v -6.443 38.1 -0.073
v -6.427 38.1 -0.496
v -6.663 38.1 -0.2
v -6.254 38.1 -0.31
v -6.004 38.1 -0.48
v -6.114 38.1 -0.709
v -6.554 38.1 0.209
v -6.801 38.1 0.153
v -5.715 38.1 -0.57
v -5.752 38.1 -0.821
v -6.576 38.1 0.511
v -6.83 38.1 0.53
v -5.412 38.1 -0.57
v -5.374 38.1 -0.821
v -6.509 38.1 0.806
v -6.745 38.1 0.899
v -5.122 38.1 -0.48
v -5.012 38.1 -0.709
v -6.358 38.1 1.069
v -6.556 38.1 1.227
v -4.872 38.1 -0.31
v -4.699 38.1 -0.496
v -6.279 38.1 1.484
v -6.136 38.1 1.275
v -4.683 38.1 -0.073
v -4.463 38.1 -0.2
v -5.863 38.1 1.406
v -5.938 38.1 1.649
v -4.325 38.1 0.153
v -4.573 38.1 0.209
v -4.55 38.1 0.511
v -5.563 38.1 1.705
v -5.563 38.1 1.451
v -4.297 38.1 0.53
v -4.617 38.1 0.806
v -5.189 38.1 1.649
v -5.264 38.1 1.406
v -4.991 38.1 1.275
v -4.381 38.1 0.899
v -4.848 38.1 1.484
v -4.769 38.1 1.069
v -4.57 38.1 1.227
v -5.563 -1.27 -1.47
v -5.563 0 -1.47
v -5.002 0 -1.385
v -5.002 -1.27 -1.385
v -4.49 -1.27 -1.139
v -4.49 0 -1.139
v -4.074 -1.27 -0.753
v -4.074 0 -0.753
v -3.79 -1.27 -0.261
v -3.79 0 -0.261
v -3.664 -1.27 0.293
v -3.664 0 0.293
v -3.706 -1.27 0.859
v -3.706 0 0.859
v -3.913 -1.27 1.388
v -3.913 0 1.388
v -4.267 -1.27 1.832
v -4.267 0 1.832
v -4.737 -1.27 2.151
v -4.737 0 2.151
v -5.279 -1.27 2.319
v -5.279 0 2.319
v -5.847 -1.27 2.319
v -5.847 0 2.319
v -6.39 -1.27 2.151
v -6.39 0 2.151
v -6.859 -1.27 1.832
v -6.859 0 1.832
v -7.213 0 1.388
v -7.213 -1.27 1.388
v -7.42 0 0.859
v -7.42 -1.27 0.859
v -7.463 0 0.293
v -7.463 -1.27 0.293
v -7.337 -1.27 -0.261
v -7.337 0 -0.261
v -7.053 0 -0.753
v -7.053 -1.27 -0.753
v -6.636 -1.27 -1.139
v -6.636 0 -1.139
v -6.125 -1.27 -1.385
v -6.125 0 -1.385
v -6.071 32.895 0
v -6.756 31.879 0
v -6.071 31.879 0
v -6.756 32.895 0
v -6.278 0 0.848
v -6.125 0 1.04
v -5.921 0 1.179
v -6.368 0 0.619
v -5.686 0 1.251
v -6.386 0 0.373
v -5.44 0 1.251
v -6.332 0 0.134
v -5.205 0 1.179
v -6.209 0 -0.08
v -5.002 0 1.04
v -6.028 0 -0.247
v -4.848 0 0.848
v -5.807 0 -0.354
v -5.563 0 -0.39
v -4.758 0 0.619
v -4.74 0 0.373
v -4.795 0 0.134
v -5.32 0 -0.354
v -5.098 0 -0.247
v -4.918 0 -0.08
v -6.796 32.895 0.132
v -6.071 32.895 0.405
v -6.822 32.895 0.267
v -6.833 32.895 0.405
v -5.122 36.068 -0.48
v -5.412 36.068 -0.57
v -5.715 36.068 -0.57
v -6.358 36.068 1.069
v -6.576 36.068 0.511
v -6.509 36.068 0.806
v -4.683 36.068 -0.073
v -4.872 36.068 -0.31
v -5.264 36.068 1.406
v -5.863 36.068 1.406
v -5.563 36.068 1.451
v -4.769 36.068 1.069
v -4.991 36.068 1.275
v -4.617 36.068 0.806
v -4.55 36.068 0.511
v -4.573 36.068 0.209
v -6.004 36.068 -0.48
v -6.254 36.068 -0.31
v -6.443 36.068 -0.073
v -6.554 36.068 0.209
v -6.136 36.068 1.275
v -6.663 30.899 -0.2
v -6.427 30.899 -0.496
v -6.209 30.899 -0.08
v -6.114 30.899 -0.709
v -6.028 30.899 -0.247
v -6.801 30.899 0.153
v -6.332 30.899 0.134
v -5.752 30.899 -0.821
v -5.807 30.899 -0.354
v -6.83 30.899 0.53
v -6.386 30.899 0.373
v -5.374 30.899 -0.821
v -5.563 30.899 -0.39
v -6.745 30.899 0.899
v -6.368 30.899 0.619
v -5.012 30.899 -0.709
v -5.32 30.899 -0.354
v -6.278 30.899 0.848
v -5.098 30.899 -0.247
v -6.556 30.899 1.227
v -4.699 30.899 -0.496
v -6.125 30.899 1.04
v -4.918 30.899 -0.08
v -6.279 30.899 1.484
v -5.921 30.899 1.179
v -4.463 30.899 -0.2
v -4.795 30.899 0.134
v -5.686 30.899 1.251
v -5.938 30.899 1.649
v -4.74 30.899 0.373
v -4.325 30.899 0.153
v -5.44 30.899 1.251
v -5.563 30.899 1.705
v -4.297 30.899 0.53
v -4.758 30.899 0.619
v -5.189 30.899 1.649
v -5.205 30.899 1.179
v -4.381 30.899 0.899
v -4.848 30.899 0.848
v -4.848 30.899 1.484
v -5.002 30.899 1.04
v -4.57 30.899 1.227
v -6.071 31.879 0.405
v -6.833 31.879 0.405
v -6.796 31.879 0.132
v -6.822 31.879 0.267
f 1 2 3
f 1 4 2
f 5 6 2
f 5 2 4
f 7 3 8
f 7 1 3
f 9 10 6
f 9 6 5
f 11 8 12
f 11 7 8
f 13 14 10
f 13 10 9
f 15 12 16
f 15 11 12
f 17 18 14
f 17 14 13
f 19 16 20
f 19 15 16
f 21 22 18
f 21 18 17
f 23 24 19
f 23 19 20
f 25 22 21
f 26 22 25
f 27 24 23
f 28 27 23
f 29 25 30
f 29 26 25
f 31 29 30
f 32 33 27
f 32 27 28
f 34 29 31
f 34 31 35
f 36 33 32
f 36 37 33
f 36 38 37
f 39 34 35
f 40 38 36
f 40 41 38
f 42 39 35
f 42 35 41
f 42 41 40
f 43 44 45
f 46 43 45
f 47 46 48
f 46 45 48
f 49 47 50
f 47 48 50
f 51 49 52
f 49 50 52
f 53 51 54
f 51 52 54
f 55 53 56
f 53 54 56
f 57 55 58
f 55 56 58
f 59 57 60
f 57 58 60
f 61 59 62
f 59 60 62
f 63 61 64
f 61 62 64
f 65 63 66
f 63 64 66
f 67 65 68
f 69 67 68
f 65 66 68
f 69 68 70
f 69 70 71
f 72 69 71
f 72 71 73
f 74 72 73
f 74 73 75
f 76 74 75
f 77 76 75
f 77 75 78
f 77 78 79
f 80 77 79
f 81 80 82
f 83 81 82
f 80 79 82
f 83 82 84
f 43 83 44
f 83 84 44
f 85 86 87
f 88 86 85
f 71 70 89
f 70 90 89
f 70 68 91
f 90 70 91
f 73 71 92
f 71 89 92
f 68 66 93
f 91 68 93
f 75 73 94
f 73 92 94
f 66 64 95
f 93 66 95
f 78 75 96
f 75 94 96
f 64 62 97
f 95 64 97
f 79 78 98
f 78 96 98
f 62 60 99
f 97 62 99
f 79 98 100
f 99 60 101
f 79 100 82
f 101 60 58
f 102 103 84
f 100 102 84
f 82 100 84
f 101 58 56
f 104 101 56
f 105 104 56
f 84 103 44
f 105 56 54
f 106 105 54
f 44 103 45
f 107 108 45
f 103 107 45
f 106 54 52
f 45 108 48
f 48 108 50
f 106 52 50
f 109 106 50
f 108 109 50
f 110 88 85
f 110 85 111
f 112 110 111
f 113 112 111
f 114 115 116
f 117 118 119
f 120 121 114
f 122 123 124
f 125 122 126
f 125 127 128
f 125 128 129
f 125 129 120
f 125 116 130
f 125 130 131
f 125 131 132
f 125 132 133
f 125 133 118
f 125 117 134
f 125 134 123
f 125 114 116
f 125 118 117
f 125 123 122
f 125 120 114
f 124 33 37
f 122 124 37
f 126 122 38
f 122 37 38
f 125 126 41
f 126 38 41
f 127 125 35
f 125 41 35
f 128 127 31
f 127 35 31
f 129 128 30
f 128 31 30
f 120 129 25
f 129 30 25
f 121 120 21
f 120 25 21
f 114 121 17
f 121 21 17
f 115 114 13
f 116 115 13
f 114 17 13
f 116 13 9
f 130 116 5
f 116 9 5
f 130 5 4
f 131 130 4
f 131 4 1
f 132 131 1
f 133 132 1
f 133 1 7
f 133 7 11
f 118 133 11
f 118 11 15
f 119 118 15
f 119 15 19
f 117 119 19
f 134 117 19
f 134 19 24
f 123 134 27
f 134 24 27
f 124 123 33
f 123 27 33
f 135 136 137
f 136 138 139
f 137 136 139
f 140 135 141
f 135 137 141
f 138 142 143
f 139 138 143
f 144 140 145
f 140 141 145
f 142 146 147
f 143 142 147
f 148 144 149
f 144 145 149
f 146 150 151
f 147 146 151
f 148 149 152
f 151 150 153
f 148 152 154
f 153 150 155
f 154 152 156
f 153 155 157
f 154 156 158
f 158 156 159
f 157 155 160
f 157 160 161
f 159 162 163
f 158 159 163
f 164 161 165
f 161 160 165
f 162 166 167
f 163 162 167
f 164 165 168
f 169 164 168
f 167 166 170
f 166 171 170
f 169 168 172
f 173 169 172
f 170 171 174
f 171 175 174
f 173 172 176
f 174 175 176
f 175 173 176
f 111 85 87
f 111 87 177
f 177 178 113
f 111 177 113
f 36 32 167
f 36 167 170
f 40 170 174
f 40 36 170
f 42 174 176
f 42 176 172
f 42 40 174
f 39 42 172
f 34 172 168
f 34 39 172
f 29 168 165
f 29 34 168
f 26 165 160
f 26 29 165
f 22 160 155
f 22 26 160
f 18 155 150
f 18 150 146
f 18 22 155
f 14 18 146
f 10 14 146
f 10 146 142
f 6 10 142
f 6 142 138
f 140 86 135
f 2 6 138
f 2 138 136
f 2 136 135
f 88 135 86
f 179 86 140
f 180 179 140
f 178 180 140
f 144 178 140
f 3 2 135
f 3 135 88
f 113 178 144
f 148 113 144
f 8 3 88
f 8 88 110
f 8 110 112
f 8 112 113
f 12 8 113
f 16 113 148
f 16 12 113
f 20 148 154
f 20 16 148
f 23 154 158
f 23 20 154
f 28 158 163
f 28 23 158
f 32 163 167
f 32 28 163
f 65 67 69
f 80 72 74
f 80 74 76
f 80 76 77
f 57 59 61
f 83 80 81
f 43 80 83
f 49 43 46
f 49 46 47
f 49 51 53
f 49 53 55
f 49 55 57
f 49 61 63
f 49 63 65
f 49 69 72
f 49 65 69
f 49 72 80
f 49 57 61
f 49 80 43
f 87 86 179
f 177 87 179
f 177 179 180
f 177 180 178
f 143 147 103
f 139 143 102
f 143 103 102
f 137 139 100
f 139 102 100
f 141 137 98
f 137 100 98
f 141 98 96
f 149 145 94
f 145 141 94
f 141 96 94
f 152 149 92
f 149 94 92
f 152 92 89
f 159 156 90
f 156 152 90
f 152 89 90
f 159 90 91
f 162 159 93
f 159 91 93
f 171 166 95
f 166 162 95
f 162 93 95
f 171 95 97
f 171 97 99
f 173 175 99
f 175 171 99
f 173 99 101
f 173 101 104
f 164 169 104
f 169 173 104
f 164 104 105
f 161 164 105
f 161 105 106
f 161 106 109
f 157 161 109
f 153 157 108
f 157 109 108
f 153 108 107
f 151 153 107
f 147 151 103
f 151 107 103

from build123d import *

# Parameters (mm, degrees)
SKETCH1_R           = 0.8255
BOSS_EXTRUDE1_DEPTH = 38.1
SKETCH3_R           = 1.905
BOSS_EXTRUDE2_DEPTH = 1.27
SKETCH6_R           = 1.27
BOSS_EXTRUDE5_DEPTH = 7.200607359
SKETCH8_R           = 1.016
CUT_EXTRUDE2_DEPTH  = 2.032
SKETCH9_W           = 0.40474265
SKETCH9_H           = 1.016
CUT_EXTRUDE3_DEPTH  = 0.762


with BuildPart() as part:
    # Sketch1 → Boss-Extrude1 (new body)
    with BuildSketch(Plane(origin=(0, 0, 0), x_dir=(1, 0, 0), z_dir=(0, 1, 0))):
        with Locations(Location((-5.56320867, -0.435127994, 0), (0, 0, 90))):
            Circle(SKETCH1_R)
    extrude(amount=BOSS_EXTRUDE1_DEPTH)

    # Sketch3 → Boss-Extrude2 (add)
    with BuildSketch(Plane.XZ):
        with Locations(Location((-5.56320867, 0.435127994, 0), (0, 0, 270))):
            Circle(SKETCH3_R)
    extrude(amount=BOSS_EXTRUDE2_DEPTH)

    # Sketch6 → Boss-Extrude5 (add)
    with BuildSketch(Plane(origin=(0, 38.1, 0), x_dir=(1, 0, 0), z_dir=(0, 1, 0))):
        with Locations(Location((-5.56320867, -0.435127994, 0), (0, 0, 270))):
            Circle(SKETCH6_R)
    extrude(amount=-BOSS_EXTRUDE5_DEPTH)

    # Sketch8 → Cut-Extrude2 (cut)
    with BuildSketch(Plane(origin=(0, 38.1, 0), x_dir=(1, 0, 0), z_dir=(0, 1, 0))):
        with Locations(Location((-5.56320867, -0.435127994, 0), (0, 0, 270))):
            Circle(SKETCH8_R)
    extrude(amount=-CUT_EXTRUDE2_DEPTH, mode=Mode.SUBTRACT)

    # Sketch9 → Cut-Extrude3 (cut)
    with BuildSketch(Plane.ZY.offset(6.83320867)):
        with Locations((0.202371325, 32.386805083)):
            Rectangle(SKETCH9_W, SKETCH9_H)
    extrude(amount=-CUT_EXTRUDE3_DEPTH, mode=Mode.SUBTRACT)


solid = part.part
